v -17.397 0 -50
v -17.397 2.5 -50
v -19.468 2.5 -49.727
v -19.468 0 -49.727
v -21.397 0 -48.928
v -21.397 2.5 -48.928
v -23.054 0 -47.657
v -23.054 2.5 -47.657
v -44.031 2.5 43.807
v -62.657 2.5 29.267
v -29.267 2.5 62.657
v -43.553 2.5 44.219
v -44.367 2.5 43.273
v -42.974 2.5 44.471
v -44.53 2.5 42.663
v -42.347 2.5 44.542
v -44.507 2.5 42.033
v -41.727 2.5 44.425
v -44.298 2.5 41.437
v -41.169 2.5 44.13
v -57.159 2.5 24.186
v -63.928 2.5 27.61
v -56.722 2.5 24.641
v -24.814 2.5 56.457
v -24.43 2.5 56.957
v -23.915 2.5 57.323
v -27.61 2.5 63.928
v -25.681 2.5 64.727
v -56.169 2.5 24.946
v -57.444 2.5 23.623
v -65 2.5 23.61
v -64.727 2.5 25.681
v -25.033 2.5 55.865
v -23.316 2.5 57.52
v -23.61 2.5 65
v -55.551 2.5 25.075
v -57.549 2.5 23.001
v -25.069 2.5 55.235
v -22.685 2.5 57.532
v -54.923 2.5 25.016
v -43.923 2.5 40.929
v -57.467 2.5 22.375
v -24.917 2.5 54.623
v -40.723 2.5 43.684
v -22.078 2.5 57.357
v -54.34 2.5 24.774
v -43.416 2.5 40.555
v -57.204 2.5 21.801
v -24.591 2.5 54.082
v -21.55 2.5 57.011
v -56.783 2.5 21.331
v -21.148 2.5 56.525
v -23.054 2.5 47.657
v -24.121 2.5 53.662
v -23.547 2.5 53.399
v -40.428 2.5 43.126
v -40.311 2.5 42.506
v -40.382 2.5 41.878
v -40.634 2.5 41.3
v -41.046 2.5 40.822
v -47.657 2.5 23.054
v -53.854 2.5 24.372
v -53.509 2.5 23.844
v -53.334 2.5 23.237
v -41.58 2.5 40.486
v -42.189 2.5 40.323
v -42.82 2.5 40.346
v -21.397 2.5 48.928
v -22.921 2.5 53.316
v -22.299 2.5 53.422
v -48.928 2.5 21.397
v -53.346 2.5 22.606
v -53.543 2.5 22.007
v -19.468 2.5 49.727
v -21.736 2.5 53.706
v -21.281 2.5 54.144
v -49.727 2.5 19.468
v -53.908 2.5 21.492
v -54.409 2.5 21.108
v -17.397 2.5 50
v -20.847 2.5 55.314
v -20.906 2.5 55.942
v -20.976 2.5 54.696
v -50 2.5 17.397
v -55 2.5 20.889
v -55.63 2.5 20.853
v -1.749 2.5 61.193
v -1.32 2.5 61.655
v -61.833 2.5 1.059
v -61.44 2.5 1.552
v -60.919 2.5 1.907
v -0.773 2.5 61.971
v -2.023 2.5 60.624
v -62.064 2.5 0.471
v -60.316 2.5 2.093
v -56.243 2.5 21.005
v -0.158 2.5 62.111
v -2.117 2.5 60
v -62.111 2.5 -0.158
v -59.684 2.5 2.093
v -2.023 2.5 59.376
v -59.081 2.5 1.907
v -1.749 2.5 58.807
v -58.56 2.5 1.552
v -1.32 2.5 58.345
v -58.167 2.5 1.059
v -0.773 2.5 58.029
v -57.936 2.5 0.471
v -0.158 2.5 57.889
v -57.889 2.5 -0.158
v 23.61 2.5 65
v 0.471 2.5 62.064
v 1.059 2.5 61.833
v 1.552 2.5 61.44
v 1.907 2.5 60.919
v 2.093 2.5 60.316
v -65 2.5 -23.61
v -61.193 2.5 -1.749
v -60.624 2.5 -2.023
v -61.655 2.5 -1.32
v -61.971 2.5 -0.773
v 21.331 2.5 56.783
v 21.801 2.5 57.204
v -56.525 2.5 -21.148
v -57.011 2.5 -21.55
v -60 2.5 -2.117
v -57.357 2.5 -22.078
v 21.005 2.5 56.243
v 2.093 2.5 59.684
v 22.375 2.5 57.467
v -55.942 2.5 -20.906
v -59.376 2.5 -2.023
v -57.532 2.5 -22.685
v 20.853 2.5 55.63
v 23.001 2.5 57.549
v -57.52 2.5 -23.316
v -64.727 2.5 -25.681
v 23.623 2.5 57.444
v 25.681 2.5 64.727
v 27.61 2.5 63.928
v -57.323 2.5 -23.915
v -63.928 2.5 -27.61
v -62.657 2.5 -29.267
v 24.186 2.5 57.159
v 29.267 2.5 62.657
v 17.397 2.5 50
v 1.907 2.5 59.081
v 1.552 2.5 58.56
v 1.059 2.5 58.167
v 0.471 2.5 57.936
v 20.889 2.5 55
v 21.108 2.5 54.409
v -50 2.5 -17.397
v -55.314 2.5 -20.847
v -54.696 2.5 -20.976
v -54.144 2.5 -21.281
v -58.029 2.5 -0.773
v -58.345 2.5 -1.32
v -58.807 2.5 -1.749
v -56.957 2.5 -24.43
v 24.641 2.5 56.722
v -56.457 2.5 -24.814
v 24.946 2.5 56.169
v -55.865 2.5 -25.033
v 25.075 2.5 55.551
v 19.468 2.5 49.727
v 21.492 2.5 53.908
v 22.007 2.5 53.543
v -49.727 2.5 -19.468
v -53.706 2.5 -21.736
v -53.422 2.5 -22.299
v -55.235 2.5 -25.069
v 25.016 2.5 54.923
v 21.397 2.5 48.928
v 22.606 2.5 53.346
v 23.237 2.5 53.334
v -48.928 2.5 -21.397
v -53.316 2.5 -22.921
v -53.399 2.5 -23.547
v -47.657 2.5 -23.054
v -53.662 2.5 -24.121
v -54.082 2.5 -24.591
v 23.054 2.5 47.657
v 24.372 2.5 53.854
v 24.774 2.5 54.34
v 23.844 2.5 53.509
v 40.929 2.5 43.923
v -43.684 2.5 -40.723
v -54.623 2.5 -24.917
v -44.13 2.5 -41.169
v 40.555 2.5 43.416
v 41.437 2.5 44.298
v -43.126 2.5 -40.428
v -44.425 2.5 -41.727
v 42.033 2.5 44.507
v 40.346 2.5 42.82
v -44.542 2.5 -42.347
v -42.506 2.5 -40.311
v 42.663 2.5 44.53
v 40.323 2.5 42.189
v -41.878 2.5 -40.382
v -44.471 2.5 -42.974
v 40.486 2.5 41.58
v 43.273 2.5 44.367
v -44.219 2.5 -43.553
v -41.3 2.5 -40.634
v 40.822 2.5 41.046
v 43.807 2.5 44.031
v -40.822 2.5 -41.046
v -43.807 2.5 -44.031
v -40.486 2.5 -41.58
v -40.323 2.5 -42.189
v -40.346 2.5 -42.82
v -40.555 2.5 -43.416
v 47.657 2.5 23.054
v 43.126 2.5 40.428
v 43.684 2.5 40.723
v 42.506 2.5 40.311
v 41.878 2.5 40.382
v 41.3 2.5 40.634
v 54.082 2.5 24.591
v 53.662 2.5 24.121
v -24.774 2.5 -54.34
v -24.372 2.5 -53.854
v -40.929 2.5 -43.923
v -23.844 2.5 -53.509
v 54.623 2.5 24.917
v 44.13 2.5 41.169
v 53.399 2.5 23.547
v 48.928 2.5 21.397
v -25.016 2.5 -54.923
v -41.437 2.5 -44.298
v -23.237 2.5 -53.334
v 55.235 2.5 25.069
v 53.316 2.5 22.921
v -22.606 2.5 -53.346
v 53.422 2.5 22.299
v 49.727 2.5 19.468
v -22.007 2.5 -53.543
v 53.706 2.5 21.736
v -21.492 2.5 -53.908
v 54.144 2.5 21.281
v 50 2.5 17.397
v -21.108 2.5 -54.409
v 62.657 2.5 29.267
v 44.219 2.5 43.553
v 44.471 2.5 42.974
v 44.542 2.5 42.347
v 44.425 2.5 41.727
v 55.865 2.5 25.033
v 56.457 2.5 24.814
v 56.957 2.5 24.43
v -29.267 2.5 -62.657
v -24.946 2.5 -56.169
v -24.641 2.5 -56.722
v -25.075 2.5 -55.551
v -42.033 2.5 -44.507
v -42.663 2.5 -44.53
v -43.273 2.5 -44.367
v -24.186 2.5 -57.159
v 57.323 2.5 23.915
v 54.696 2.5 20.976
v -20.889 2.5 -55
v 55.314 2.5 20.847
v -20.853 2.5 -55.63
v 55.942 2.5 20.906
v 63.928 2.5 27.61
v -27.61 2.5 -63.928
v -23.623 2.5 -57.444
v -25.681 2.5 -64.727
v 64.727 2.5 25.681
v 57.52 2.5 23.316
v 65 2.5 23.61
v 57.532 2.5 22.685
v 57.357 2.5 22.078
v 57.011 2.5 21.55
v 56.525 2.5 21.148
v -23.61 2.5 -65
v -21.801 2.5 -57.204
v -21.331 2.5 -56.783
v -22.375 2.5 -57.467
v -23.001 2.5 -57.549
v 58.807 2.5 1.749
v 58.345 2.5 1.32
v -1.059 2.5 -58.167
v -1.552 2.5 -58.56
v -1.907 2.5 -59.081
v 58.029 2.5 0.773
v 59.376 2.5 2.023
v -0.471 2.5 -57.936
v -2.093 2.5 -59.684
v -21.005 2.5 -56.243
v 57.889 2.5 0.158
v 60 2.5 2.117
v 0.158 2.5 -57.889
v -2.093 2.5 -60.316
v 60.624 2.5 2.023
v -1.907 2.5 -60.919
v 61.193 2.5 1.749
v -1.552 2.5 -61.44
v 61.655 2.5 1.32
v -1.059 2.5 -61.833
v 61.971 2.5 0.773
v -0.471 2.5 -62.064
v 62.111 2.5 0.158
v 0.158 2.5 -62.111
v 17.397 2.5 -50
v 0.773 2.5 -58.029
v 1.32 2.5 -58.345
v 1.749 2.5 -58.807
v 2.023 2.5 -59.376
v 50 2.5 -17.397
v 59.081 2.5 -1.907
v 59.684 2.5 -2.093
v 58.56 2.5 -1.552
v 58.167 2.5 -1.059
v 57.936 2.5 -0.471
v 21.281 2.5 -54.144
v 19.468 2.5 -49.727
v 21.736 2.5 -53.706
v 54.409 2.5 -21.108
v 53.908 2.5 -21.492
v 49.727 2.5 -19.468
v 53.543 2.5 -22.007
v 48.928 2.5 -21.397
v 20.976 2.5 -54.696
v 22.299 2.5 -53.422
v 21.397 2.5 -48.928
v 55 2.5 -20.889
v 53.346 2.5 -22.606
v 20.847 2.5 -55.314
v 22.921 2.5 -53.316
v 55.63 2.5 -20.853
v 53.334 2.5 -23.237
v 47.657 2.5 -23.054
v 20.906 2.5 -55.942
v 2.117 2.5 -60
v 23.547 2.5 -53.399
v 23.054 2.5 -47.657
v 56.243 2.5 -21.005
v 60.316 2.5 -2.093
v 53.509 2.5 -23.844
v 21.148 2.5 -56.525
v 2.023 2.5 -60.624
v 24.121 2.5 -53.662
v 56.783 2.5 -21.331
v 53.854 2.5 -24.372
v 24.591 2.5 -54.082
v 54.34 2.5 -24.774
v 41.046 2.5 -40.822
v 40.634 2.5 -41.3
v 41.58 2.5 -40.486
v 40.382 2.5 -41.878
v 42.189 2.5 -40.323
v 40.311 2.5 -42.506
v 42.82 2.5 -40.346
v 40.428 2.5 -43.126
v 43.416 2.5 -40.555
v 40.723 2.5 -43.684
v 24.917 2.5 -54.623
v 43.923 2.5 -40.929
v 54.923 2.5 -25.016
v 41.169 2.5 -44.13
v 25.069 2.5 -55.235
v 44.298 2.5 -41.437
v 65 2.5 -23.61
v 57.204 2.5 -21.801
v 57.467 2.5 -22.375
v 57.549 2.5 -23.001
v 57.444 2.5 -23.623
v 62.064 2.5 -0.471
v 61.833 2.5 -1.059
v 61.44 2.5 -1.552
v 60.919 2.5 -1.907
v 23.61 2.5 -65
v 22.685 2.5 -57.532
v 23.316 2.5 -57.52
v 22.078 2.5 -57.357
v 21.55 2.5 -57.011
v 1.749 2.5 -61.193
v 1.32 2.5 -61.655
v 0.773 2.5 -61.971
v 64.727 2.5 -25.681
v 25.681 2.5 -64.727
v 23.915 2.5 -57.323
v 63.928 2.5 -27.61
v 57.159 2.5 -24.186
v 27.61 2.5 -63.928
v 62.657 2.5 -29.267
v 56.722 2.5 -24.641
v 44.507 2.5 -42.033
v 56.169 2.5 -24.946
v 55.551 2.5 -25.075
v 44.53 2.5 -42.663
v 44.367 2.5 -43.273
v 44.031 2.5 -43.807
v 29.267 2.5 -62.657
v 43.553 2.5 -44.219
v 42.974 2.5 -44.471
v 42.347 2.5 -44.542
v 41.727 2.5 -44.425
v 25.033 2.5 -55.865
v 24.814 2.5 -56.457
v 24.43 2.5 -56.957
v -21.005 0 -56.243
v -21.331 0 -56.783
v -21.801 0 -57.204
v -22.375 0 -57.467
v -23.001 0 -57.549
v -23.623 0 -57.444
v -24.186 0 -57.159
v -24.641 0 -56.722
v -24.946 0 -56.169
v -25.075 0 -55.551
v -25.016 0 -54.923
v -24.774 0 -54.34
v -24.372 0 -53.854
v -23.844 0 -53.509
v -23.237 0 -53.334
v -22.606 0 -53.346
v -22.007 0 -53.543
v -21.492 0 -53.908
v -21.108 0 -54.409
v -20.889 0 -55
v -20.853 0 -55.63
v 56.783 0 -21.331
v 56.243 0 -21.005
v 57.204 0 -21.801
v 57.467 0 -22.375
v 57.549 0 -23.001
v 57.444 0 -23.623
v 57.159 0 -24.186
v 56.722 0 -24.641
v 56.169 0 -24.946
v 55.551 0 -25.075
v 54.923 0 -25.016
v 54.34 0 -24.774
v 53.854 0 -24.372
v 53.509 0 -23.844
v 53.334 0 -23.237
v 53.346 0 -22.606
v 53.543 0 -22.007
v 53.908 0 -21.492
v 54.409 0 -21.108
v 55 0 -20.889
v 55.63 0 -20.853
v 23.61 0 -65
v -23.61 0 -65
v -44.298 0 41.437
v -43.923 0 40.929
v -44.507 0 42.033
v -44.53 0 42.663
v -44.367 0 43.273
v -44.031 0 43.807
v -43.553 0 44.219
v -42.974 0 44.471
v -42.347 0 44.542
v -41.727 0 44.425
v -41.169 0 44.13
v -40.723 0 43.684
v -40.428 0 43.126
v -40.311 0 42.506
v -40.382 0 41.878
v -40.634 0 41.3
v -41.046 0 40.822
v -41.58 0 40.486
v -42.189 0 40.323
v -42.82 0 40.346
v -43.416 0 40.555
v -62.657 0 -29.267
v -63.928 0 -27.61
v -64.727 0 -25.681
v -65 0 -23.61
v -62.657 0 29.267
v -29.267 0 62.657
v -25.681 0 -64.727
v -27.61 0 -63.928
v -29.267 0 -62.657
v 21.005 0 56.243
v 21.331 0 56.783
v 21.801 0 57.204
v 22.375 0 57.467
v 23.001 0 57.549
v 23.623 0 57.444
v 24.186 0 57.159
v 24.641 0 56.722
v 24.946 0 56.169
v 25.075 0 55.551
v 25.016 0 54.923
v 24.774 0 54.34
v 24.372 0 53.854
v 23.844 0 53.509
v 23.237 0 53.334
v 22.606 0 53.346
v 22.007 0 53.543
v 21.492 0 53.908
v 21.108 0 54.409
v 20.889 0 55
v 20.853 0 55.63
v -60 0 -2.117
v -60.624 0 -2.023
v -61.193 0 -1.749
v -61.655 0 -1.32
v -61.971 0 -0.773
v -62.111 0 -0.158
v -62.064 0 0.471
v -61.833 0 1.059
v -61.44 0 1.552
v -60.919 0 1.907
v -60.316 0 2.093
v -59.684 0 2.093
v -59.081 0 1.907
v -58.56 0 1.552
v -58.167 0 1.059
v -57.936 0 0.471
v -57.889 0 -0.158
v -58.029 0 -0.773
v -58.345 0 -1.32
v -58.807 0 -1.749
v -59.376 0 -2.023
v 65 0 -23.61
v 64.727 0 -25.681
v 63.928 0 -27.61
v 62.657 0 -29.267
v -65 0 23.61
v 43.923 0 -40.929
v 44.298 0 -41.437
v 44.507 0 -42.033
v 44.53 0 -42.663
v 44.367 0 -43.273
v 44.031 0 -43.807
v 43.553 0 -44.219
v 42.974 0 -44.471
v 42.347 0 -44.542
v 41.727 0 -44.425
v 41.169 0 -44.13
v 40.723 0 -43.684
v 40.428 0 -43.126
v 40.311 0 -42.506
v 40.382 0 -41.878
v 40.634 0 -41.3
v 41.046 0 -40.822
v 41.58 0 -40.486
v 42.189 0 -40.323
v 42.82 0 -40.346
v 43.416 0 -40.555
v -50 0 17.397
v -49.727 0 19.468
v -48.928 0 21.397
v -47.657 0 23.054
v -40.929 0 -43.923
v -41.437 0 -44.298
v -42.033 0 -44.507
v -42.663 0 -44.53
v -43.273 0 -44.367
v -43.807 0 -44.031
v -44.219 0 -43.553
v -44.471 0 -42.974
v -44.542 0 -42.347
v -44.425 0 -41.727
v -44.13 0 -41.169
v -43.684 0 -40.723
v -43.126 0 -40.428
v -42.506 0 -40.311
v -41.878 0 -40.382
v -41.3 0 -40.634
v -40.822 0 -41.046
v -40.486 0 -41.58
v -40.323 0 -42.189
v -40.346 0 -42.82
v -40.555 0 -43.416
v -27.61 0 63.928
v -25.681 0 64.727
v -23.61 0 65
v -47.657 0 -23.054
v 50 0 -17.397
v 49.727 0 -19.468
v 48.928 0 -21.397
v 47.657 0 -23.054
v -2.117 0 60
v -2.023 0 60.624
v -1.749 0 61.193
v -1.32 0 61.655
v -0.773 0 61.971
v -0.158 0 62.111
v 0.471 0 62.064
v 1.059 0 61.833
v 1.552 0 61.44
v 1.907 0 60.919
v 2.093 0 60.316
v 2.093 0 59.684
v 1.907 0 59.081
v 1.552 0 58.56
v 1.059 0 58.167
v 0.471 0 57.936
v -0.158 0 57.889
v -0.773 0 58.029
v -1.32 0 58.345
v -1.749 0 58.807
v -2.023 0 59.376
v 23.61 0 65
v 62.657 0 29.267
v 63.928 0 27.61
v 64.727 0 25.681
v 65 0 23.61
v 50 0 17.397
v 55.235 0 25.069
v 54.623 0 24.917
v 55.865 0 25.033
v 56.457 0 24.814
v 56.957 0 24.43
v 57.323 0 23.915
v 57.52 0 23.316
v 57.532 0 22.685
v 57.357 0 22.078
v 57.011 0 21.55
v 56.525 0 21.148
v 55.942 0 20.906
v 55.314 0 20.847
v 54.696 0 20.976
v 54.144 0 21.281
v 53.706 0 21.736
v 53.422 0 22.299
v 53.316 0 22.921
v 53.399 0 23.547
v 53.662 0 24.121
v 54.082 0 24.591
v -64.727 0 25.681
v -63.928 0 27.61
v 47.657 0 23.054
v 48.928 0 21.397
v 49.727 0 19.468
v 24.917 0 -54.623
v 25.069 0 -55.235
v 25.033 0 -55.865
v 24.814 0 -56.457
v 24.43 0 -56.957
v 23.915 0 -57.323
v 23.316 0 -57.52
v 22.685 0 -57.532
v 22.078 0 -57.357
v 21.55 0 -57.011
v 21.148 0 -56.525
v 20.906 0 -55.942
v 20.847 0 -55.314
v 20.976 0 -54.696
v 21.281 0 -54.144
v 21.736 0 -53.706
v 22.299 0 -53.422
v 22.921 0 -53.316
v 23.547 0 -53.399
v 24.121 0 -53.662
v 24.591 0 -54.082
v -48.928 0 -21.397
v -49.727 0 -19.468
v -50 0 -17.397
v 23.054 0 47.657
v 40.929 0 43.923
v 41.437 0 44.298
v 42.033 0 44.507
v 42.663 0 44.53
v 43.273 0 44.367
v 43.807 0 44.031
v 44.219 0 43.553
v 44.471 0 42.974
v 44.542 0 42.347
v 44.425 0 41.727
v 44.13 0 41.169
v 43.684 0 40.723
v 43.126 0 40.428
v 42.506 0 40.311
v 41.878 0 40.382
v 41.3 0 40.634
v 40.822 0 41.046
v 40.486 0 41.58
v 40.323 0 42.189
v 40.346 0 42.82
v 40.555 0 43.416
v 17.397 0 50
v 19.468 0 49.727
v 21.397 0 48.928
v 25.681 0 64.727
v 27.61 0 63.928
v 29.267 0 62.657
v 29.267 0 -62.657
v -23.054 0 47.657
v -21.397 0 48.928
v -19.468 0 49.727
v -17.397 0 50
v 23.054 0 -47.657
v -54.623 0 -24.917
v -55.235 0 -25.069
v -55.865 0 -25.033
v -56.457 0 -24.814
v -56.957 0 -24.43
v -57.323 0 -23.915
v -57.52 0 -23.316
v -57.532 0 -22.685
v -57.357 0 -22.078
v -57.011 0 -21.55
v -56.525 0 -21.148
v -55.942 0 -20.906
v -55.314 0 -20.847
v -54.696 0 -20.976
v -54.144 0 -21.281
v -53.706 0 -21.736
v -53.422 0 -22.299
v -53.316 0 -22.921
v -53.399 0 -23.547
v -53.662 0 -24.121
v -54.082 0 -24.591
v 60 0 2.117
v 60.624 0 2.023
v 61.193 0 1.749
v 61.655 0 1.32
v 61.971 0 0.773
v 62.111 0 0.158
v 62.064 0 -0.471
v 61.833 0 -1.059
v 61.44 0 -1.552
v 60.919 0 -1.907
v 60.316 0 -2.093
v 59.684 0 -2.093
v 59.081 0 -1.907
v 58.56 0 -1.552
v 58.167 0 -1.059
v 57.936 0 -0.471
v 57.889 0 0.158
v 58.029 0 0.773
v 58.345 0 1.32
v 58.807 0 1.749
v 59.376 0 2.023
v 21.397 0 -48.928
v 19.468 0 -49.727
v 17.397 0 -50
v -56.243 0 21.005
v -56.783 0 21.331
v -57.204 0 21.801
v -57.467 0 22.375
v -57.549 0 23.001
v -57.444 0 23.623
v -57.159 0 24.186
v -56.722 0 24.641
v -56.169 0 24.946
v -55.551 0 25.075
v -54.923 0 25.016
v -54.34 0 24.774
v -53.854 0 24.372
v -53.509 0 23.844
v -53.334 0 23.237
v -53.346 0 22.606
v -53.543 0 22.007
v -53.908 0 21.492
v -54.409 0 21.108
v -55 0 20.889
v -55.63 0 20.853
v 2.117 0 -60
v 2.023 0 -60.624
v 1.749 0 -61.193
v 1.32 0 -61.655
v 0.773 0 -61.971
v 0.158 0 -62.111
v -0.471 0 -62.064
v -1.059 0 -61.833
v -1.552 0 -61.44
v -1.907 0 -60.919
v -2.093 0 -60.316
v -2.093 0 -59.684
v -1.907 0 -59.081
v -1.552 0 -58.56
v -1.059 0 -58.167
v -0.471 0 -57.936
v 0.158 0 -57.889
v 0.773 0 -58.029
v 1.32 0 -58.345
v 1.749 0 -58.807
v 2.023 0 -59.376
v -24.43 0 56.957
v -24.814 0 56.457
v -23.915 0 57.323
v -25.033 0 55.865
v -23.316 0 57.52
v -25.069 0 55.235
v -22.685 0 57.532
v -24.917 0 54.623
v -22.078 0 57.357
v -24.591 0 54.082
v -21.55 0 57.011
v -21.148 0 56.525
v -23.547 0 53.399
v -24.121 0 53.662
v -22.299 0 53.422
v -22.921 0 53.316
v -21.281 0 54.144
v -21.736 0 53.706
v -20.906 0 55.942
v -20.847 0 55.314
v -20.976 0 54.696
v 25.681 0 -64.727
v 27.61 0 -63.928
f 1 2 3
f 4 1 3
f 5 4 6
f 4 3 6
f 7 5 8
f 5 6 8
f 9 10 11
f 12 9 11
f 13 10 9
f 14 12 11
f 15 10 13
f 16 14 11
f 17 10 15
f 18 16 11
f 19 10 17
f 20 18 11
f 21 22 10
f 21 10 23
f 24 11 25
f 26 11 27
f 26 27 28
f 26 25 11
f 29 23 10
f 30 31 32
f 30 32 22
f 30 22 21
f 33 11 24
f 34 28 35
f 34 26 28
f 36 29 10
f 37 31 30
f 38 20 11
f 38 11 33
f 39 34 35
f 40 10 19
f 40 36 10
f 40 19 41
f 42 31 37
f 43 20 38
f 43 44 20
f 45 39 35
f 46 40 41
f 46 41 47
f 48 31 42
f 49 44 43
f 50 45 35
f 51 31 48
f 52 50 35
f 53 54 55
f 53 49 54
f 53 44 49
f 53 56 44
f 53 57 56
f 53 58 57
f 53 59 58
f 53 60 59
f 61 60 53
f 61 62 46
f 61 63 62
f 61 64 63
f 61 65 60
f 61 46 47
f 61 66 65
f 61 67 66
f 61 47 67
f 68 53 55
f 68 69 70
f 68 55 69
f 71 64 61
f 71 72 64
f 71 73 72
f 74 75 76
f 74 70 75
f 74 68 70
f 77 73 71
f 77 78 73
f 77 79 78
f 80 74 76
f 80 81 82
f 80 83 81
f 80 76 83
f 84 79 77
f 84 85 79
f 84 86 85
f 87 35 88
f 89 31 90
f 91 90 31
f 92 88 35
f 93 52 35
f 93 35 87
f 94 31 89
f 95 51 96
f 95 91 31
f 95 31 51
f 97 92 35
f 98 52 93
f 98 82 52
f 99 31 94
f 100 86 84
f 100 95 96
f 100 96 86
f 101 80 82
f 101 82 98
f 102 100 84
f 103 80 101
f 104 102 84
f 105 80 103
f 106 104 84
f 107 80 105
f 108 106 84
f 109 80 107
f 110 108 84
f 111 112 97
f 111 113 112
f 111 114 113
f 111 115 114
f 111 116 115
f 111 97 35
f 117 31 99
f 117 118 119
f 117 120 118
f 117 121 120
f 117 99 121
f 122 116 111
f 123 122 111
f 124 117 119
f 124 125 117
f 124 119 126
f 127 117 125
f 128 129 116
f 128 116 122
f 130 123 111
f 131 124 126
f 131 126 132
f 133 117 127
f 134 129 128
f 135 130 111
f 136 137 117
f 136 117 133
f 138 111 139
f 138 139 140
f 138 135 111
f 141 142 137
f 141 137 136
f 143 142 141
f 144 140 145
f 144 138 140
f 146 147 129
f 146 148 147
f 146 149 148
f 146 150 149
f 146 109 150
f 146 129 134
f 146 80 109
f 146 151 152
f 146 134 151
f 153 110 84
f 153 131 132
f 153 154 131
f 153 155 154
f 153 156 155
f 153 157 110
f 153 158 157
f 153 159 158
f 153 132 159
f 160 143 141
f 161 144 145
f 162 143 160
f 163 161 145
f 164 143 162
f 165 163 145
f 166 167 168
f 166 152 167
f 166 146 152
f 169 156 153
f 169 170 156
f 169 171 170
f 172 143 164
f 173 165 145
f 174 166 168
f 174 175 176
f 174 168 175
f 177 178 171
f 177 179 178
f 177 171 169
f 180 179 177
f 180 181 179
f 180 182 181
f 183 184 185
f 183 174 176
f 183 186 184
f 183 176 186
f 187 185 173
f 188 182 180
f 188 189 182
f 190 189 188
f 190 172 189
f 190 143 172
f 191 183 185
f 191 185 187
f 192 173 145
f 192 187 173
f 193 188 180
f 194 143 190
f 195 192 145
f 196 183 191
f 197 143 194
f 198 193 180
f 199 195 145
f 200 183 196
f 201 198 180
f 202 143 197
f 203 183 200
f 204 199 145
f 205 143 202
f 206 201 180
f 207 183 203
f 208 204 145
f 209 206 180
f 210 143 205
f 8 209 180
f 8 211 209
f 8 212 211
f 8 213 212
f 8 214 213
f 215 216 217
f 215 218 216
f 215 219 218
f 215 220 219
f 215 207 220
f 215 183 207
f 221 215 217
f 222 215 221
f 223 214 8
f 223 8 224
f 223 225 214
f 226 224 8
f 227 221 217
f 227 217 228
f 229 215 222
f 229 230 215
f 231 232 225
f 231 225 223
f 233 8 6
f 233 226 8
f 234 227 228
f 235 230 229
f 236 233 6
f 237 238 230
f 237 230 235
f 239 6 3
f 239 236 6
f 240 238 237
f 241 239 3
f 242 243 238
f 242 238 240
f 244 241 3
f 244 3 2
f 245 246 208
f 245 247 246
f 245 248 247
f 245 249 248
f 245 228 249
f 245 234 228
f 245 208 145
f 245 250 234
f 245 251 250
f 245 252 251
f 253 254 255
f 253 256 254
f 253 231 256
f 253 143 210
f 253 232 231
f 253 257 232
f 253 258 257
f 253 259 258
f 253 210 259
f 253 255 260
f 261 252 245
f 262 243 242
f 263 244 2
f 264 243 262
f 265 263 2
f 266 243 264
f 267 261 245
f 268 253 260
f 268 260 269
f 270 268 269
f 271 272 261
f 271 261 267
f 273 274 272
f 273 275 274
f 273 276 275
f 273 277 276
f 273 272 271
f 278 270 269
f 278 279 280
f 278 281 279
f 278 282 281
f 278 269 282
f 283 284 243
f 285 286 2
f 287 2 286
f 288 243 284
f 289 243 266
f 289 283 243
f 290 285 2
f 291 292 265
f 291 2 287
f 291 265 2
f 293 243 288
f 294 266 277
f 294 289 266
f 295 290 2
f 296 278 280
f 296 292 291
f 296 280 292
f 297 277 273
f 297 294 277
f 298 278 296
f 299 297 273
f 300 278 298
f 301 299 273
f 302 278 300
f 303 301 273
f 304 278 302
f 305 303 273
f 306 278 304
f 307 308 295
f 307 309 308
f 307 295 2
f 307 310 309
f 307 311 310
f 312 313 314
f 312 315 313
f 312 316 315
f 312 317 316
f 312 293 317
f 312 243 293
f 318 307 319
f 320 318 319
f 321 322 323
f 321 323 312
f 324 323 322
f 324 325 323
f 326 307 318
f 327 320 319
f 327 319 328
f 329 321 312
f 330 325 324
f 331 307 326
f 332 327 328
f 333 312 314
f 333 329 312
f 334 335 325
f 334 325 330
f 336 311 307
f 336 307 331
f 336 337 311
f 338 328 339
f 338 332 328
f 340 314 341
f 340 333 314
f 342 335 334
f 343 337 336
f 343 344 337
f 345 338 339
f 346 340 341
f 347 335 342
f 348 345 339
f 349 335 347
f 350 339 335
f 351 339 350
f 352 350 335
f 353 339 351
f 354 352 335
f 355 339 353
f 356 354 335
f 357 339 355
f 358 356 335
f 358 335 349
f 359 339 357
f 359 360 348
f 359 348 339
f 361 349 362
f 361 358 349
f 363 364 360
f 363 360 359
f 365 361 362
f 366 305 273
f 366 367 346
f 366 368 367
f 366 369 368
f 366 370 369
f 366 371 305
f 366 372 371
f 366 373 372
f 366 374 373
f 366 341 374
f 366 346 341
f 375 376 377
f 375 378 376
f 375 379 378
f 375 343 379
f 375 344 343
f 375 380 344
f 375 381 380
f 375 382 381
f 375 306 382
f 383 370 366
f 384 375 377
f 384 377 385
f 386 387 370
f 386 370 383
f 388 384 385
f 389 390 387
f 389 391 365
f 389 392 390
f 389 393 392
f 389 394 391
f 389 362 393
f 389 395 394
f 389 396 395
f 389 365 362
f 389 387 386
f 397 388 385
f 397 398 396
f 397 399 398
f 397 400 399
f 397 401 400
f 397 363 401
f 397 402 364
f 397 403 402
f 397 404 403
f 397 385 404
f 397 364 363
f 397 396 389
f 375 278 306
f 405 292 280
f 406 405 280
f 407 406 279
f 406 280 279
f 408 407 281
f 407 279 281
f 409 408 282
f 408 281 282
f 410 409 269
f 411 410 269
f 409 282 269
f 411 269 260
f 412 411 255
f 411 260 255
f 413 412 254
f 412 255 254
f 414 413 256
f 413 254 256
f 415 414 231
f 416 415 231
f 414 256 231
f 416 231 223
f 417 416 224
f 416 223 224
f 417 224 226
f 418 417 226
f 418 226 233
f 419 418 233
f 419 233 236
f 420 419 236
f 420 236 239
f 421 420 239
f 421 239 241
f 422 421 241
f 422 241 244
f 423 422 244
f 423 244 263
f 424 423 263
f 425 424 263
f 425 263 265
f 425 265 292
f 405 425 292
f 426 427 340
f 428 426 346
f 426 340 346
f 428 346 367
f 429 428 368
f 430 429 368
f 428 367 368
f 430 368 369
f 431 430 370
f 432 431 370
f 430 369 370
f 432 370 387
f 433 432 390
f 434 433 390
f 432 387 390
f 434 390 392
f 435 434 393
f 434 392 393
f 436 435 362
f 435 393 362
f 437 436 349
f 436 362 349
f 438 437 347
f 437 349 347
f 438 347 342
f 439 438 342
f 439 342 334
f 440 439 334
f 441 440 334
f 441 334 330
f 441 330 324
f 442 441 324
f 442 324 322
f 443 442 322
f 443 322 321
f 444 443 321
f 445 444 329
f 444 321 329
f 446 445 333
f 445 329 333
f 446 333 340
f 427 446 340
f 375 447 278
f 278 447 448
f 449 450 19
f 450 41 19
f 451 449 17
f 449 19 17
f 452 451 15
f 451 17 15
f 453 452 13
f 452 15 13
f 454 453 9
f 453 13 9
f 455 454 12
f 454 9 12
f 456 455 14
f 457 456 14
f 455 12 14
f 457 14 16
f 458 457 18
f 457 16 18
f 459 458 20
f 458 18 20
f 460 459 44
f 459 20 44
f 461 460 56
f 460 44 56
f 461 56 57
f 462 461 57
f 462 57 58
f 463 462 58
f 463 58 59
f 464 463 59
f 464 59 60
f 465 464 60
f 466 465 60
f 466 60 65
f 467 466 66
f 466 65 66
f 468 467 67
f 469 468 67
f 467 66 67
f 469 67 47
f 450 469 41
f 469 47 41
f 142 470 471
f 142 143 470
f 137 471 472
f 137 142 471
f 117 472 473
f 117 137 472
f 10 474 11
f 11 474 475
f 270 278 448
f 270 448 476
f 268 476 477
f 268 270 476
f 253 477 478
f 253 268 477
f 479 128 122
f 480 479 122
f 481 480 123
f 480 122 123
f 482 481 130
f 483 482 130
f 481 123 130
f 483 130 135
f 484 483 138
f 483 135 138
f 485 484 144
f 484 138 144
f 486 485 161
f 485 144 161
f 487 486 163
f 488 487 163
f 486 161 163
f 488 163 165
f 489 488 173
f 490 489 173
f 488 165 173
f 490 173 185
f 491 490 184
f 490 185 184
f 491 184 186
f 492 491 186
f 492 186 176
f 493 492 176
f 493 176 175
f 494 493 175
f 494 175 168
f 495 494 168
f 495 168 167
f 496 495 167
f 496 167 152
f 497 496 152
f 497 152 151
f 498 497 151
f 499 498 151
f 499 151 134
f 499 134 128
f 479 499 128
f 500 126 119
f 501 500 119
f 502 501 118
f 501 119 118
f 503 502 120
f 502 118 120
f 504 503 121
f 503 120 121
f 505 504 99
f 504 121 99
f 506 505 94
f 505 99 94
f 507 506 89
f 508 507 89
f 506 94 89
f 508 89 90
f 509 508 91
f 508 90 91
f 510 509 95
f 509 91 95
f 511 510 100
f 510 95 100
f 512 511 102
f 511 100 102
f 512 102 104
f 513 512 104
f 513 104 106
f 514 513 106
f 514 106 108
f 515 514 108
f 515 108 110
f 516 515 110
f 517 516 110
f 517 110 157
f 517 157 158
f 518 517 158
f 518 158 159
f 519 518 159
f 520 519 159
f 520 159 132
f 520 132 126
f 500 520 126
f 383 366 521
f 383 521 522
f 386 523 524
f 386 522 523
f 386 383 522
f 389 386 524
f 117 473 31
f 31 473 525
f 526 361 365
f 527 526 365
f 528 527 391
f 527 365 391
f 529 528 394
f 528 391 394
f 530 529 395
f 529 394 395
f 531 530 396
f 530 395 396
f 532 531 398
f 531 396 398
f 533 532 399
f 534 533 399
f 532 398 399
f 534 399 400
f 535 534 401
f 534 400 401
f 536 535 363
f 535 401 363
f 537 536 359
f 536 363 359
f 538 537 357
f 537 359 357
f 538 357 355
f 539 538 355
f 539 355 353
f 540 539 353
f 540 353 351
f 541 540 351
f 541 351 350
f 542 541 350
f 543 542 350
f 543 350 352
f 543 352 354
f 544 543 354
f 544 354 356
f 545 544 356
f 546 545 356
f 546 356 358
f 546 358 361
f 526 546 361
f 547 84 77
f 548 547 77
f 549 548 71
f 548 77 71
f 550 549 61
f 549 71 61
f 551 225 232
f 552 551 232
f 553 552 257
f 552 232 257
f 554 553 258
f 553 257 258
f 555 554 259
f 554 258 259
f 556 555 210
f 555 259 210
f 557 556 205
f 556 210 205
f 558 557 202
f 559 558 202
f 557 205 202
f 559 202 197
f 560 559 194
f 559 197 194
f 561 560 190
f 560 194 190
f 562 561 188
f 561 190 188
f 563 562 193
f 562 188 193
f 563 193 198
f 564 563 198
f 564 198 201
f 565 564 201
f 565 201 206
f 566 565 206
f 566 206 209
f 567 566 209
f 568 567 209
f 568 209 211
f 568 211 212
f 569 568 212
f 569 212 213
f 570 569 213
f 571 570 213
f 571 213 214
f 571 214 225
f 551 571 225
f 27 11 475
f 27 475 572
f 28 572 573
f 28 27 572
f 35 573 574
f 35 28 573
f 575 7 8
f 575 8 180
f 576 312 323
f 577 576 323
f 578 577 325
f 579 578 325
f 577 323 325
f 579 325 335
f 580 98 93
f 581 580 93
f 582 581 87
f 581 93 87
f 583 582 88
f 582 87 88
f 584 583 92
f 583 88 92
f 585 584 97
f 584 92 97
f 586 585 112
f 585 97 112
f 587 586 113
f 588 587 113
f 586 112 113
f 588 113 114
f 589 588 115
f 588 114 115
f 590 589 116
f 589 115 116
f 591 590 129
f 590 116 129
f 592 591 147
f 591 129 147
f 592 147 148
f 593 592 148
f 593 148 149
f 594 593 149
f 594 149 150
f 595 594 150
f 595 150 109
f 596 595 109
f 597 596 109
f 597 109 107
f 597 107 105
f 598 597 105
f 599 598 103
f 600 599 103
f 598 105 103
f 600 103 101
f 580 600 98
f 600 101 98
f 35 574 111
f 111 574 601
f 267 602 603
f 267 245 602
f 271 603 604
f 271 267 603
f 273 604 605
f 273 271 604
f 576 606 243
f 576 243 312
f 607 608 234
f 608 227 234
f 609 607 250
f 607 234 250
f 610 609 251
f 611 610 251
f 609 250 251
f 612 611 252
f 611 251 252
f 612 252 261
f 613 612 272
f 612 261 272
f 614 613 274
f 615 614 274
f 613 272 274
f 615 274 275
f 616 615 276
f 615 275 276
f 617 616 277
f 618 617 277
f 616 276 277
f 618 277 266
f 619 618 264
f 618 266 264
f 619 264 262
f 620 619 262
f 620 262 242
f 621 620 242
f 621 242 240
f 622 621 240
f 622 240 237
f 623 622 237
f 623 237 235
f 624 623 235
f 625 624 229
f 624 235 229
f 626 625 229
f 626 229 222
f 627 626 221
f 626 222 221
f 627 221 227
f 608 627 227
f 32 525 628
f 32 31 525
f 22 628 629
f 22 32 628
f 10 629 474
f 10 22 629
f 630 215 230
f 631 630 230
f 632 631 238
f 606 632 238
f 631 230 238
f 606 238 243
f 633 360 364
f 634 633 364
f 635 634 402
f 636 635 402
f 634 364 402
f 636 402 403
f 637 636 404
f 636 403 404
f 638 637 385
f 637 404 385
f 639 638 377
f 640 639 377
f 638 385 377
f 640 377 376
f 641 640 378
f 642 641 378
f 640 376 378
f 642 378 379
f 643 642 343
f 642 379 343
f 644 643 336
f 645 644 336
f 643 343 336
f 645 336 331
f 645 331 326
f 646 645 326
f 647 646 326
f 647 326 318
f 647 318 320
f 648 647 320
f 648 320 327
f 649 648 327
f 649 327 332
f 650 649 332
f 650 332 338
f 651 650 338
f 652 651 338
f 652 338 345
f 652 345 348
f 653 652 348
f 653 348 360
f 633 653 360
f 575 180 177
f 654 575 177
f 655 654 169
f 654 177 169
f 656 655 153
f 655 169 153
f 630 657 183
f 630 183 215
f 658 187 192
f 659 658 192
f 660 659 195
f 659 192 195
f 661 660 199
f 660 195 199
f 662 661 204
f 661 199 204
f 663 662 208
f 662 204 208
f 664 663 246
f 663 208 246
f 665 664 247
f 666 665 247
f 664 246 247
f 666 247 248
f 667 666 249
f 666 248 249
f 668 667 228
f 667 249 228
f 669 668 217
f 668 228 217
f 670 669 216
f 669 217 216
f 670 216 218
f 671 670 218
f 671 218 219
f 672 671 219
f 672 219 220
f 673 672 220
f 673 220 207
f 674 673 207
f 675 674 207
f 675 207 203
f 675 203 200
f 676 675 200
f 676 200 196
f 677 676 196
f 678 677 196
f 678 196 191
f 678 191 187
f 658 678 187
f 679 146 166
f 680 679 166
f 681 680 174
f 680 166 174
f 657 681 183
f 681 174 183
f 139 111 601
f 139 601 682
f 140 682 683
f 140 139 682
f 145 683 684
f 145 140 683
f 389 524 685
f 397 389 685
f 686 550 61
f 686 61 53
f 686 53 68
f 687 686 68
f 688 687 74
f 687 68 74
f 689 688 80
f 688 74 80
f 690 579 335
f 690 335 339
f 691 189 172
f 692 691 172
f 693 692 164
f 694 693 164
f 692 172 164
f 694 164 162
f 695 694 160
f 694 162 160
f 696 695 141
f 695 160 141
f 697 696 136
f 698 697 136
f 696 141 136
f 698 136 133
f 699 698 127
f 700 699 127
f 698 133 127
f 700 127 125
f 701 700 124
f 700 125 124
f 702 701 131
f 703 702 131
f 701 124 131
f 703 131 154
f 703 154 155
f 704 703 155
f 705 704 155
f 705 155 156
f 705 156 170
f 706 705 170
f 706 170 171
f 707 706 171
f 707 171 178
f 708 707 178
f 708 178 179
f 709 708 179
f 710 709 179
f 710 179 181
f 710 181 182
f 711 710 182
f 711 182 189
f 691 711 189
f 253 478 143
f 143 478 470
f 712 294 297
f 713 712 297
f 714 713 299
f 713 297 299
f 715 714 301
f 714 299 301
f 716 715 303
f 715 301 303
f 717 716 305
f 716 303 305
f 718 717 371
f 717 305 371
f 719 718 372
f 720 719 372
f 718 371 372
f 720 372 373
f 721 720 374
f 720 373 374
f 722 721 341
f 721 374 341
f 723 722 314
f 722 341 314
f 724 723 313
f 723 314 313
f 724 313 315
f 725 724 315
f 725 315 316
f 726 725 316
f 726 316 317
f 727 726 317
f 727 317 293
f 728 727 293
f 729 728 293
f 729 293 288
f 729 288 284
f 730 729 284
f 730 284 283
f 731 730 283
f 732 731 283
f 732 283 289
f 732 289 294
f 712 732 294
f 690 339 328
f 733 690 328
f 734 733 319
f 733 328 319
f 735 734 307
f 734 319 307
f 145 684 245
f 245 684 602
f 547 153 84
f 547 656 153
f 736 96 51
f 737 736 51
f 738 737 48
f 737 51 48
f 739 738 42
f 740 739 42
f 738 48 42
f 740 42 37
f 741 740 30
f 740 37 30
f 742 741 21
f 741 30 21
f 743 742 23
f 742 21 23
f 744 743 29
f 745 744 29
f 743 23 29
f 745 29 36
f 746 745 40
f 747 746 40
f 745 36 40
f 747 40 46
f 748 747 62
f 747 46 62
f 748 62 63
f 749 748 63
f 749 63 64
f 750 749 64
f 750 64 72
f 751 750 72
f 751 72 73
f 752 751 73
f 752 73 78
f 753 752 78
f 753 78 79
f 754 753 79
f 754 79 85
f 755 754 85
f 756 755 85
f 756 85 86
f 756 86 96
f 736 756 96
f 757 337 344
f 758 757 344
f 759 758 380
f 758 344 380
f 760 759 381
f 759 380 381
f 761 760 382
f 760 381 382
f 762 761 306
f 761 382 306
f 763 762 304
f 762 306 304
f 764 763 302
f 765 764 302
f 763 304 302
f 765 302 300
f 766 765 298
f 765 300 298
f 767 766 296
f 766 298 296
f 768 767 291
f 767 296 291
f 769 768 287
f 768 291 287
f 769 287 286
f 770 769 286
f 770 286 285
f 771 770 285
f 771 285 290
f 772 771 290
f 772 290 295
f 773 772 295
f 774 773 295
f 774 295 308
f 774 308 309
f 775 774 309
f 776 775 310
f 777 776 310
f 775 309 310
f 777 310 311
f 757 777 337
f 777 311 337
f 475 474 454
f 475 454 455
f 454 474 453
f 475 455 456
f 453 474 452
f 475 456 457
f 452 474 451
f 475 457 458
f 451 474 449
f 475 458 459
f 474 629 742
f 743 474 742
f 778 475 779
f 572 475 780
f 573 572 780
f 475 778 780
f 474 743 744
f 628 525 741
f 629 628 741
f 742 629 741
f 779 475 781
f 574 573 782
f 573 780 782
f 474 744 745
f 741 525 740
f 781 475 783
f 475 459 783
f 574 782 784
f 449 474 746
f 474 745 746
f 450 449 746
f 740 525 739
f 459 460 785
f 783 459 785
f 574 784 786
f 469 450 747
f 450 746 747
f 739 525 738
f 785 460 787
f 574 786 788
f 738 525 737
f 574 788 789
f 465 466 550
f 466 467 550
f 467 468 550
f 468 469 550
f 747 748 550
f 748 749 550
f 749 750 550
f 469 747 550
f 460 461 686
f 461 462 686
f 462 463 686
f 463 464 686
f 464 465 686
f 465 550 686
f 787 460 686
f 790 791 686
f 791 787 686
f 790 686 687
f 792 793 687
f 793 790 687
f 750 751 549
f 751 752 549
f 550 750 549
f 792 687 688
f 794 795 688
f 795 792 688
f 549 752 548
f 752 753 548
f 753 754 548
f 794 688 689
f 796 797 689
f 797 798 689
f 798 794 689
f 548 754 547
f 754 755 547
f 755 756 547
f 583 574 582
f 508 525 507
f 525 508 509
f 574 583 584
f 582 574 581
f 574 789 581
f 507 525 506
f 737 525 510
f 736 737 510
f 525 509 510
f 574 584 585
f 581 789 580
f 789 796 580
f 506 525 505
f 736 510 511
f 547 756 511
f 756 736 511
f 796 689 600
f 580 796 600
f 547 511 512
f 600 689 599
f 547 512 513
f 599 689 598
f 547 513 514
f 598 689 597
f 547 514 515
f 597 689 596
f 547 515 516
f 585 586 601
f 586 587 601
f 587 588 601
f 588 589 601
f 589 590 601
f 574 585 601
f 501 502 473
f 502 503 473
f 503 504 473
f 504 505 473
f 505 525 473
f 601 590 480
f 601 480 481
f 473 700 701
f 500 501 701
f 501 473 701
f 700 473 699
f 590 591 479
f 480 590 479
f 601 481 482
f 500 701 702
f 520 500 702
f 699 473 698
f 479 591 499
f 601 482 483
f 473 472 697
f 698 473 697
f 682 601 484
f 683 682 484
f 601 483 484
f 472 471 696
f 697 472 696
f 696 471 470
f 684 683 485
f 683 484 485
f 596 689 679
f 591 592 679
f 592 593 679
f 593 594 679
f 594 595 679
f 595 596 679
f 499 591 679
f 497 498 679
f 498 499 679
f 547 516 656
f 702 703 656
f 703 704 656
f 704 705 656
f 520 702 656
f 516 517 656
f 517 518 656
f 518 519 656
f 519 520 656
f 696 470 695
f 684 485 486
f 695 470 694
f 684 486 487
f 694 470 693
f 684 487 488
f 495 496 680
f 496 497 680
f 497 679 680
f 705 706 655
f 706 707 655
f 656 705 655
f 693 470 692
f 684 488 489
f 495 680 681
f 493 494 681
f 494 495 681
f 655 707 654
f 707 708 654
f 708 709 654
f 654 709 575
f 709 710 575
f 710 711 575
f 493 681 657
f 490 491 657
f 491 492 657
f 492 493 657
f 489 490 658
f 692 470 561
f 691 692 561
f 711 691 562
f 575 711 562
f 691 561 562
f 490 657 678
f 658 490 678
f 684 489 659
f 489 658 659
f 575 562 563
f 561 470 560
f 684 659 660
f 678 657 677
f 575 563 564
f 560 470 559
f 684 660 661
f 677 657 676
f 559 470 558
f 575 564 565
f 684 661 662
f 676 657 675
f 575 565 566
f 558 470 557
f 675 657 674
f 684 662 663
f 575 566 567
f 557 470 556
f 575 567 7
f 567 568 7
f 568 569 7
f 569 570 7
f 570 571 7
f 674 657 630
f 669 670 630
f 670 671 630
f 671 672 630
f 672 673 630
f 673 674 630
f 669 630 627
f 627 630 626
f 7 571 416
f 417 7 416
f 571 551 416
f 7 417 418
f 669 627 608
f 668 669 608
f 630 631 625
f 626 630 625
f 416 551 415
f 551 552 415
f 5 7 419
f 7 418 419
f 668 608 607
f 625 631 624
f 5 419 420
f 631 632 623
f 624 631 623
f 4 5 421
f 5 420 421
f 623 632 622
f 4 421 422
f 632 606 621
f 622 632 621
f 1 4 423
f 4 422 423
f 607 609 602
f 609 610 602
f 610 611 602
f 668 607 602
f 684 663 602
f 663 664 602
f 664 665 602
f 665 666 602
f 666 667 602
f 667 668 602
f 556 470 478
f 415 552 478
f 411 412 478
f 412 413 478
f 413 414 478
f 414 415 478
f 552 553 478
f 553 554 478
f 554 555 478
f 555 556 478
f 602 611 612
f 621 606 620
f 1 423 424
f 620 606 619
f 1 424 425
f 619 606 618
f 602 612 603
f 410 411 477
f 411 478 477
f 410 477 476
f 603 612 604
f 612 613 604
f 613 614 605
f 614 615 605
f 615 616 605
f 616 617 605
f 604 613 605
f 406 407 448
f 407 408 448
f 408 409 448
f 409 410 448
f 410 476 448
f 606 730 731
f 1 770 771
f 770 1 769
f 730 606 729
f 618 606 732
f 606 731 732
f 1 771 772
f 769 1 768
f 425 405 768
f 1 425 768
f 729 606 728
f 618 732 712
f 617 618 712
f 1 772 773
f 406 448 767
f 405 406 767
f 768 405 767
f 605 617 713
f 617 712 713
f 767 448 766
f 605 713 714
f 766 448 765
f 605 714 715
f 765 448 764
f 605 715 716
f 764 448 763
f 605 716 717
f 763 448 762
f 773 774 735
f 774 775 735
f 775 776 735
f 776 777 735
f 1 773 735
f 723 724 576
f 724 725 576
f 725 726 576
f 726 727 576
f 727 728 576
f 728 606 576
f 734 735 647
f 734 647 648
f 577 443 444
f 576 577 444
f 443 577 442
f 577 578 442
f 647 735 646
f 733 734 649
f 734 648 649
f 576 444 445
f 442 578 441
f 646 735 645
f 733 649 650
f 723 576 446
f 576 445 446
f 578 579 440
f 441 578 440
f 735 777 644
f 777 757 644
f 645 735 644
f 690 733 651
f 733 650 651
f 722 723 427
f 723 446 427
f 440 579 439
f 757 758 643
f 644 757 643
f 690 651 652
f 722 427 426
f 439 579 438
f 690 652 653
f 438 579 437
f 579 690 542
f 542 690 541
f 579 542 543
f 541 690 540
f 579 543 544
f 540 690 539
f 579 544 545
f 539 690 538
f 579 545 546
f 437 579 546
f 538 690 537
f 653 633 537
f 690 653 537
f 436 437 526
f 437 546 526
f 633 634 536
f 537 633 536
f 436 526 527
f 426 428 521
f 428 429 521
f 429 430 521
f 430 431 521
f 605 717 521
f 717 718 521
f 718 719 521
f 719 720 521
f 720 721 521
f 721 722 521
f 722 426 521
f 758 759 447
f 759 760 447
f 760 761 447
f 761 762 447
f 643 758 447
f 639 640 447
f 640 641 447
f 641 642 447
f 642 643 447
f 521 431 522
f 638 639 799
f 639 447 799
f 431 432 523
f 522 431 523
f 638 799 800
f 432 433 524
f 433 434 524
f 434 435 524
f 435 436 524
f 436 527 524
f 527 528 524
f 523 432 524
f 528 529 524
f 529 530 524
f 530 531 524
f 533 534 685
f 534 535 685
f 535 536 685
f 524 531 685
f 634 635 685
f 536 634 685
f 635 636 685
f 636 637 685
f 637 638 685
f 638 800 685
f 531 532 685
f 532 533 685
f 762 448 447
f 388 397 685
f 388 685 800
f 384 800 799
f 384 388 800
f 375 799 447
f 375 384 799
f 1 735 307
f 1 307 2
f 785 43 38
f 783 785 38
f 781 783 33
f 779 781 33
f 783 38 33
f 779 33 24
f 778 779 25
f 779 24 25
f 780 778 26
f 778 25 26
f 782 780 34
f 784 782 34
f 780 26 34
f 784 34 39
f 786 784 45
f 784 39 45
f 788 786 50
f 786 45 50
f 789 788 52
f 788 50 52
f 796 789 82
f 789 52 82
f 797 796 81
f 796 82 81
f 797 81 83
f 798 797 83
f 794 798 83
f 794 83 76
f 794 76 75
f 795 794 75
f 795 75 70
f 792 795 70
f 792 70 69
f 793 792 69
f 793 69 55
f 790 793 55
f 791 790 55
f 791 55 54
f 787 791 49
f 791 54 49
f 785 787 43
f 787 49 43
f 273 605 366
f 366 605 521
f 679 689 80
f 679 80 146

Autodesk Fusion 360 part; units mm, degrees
sketch "Sketch1" plane through (0, 0, 0) normal (0, 1, 0) x (1, 0, 0)
  circle A0 centre (0, 0) radius 60 construction
  line L0 (-65, -26.9239) -> (-26.9239, -65)
  line L1 (-26.9239, -65) -> (26.9239, -65)
  line L2 (26.9239, -65) -> (65, -26.9239)
  line L3 (65, -26.9239) -> (65, 26.9239)
  line L4 (65, 26.9239) -> (26.9239, 65)
  line L5 (26.9239, 65) -> (-26.9239, 65)
  line L6 (-26.9239, 65) -> (-65, 26.9239)
  line L7 (-65, 26.9239) -> (-65, -26.9239)
  line L8 (-20.7107, -50) -> (20.7107, -50)
  line L9 (20.7107, -50) -> (50, -20.7107)
  line L10 (50, -20.7107) -> (50, 20.7107)
  line L11 (50, 20.7107) -> (20.7107, 50)
  line L12 (20.7107, 50) -> (-20.7107, 50)
  line L13 (-20.7107, 50) -> (-50, 20.7107)
  line L14 (-50, 20.7107) -> (-50, -20.7107)
  line L15 (-50, -20.7107) -> (-20.7107, -50)
  point P0 (-60, 0)
  dimension "d1" = 120
  dimension "d2" = 65
  dimension "d3" = 130
  dimension "d4" = -15
extrude "Extrude1" add sketch "Sketch1" along normal blind 2.5
hole "Hole1" at (-60, 0, 0) direction (0, 1, 0) diameter 4.234 depth 100 tip angle 118
pattern_circular "C-Pattern1" count 16 over 360 about axis through (0, 1.75, 0) along (0, 1, 0) of "Hole1"
fillet "Fillet1" radius 8 16 edges at (-26.9239, 1.25, 65) (26.9239, 1.25, 65) (65, 1.25, 26.9239) (65, 1.25, -26.9239) (26.9239, 1.25, -65) (-26.9239, 1.25, -65) (-65, 1.25, -26.9239) (-65, 1.25, 26.9239) (20.7107, 1.25, -50) (50, 1.25, -20.7107) (50, 1.25, 20.7107) (20.7107, 1.25, 50) (-20.7107, 1.25, 50) (-50, 1.25, 20.7107) (-50, 1.25, -20.7107) (-20.7107, 1.25, -50)
sketch "stage 2 connector clamp cutting pattern" plane through (0, 2.5, 0) normal (0, 1, 0) x (-1, 0, 0)
  arc A0 (65, 23.6102) -> (62.6569, 29.267) centre (57, 23.6102) ccw
  line L0 (62.6569, 29.267) -> (29.267, 62.6569)
  arc A1 (29.267, 62.6569) -> (23.6102, 65) centre (23.6102, 57) ccw
  line L1 (23.6102, 65) -> (-23.6102, 65)
  arc A2 (-23.6102, 65) -> (-29.267, 62.6569) centre (-23.6102, 57) ccw
  line L2 (-29.267, 62.6569) -> (-62.6569, 29.267)
  arc A3 (-62.6569, 29.267) -> (-65, 23.6102) centre (-57, 23.6102) ccw
  line L3 (-65, 23.6102) -> (-65, -23.6102)
  arc A4 (-65, -23.6102) -> (-62.6569, -29.267) centre (-57, -23.6102) ccw
  line L4 (-62.6569, -29.267) -> (-29.267, -62.6569)
  arc A5 (-29.267, -62.6569) -> (-23.6102, -65) centre (-23.6102, -57) ccw
  line L5 (-23.6102, -65) -> (23.6102, -65)
  arc A6 (23.6102, -65) -> (29.267, -62.6569) centre (23.6102, -57) ccw
  line L6 (29.267, -62.6569) -> (62.6569, -29.267)
  arc A7 (62.6569, -29.267) -> (65, -23.6102) centre (57, -23.6102) ccw
  line L7 (65, -23.6102) -> (65, 23.6102)
  circle A8 centre (55.4328, -22.961) radius 2.117
  circle A9 centre (42.4264, -42.4264) radius 2.117
  circle A10 centre (22.961, -55.4328) radius 2.117
  circle A11 centre (0, -60) radius 2.117
  circle A12 centre (-22.961, -55.4328) radius 2.117
  circle A13 centre (-42.4264, -42.4264) radius 2.117
  circle A14 centre (-55.4328, -22.961) radius 2.117
  circle A15 centre (-60, 0) radius 2.117
  circle A16 centre (-55.4328, 22.961) radius 2.117
  circle A17 centre (-42.4264, 42.4264) radius 2.117
  circle A18 centre (-22.961, 55.4328) radius 2.117
  circle A19 centre (0, 60) radius 2.117
  circle A20 centre (22.961, 55.4328) radius 2.117
  circle A21 centre (42.4264, 42.4264) radius 2.117
  circle A22 centre (55.4328, 22.961) radius 2.117
  circle A23 centre (60, 0) radius 2.117
  line L8 (23.0538, 47.6569) -> (47.6569, 23.0538)
  arc A24 (50, 17.397) -> (47.6569, 23.0538) centre (42, 17.397) ccw
  line L9 (50, 17.397) -> (50, -17.397)
  arc A25 (47.6569, -23.0538) -> (50, -17.397) centre (42, -17.397) ccw
  line L10 (47.6569, -23.0538) -> (23.0538, -47.6569)
  arc A26 (17.397, -50) -> (23.0538, -47.6569) centre (17.397, -42) ccw
  line L11 (17.397, -50) -> (-17.397, -50)
  arc A27 (-23.0538, -47.6569) -> (-17.397, -50) centre (-17.397, -42) ccw
  line L12 (-23.0538, -47.6569) -> (-47.6569, -23.0538)
  arc A28 (-50, -17.397) -> (-47.6569, -23.0538) centre (-42, -17.397) ccw
  line L13 (-50, -17.397) -> (-50, 17.397)
  arc A29 (-47.6569, 23.0538) -> (-50, 17.397) centre (-42, 17.397) ccw
  line L14 (-47.6569, 23.0538) -> (-23.0538, 47.6569)
  arc A30 (-17.397, 50) -> (-23.0538, 47.6569) centre (-17.397, 42) ccw
  line L15 (-17.397, 50) -> (17.397, 50)
  arc A31 (23.0538, 47.6569) -> (17.397, 50) centre (17.397, 42) ccw
